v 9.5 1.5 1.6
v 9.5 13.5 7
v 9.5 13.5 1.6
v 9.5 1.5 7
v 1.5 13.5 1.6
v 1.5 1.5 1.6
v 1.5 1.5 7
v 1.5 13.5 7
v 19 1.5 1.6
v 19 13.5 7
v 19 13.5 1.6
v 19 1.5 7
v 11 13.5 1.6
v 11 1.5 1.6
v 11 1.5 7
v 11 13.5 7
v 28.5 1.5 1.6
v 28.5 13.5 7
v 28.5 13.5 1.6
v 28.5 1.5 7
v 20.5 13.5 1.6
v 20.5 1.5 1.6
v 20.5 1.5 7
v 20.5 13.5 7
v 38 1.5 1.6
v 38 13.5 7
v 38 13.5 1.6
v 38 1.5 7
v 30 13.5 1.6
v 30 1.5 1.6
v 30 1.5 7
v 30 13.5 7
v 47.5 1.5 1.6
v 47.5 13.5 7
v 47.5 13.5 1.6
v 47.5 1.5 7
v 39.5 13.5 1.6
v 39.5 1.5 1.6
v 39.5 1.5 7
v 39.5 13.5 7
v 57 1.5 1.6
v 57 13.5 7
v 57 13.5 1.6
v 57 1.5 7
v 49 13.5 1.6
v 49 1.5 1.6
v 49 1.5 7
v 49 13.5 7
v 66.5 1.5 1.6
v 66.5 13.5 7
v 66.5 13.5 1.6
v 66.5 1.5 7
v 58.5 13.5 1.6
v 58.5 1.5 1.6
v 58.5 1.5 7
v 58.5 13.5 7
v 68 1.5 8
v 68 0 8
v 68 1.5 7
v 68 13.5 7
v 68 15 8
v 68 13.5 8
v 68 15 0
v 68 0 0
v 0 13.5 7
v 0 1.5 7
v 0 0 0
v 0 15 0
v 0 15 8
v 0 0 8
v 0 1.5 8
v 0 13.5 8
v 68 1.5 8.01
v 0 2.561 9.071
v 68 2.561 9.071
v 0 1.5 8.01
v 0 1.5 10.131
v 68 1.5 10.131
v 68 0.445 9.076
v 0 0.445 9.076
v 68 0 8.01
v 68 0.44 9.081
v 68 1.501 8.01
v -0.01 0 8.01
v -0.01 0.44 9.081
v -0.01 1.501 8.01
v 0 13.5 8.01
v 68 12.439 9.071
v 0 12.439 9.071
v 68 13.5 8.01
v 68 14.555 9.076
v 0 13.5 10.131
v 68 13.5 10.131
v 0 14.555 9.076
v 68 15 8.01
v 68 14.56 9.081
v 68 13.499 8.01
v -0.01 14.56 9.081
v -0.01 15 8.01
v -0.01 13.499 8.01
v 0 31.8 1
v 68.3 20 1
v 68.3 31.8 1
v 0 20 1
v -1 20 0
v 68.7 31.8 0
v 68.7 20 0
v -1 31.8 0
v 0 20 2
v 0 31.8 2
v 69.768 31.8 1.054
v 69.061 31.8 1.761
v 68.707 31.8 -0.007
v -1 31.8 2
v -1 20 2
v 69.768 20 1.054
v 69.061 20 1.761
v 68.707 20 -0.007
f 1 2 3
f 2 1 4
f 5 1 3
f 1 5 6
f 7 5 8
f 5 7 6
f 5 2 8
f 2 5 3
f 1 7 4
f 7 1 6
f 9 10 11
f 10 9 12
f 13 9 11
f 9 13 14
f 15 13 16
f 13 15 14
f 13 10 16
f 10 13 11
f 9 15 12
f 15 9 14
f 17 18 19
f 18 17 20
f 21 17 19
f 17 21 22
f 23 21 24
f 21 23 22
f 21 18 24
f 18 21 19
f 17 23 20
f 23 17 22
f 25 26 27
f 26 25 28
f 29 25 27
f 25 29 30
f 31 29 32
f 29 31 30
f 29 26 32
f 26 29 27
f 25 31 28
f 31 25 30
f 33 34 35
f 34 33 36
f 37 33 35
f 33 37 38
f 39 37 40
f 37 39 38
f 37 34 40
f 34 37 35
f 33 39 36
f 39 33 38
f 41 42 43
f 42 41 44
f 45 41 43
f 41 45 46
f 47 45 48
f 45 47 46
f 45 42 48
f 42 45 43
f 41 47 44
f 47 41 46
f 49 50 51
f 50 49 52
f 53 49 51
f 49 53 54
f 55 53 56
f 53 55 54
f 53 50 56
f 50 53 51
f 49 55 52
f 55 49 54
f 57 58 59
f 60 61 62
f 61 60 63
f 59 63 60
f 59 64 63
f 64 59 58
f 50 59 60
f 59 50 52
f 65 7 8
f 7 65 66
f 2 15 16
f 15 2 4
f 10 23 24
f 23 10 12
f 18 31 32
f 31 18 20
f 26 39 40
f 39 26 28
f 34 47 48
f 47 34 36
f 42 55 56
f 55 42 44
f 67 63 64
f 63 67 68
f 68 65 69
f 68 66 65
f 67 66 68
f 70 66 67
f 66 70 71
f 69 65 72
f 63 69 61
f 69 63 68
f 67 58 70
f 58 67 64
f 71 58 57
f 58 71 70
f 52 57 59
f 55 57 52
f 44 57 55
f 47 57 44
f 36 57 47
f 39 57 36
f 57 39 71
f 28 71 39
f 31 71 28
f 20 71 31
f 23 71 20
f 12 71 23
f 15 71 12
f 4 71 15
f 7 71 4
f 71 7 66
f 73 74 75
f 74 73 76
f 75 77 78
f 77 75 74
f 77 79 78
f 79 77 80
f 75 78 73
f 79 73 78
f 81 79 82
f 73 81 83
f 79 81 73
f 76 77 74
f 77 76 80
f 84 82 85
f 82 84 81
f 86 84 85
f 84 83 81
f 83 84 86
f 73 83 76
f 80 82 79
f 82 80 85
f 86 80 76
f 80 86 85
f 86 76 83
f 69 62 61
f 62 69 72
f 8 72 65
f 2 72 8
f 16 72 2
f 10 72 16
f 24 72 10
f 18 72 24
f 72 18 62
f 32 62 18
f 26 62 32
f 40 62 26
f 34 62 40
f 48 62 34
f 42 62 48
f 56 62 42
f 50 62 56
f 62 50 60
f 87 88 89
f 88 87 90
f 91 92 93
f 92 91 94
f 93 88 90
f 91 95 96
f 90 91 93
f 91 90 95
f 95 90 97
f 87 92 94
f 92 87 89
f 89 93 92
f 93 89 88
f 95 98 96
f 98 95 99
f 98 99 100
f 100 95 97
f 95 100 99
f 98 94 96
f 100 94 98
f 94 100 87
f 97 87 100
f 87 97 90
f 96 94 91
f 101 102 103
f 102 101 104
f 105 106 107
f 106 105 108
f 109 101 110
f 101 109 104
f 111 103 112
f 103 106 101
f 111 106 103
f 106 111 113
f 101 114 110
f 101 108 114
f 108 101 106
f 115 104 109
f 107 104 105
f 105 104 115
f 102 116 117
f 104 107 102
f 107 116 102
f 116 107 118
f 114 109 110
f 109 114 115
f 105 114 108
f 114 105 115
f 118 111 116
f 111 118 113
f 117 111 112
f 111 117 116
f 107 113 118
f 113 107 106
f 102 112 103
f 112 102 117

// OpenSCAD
//widths for the pill compartments
wp = 8;
//depth for the pill compartments
dp = 12;

//wall size
ws = 1.5;
//pill box height
he = 7;

//tolerance
tol = .1;

difference()
{

cube([wp*7+ws*8, dp+ws*2, he]);

translate([ws,ws,0])
for (n = [0:6])
{
translate([n*wp+n*ws,0,ws+.1])
cube([wp,dp,10]);
}
}


//lid thingy
module lidthingy()
{
translate([0,0,he])
cube([wp*7+ws*8,ws,1]);


translate([0,ws,he+1.01])
rotate([45,0,0])
cube([wp*7+ws*8,ws,ws]);


translate([wp*7+ws*8,0,he+1.01])
rotate([0,-90,0])

linear_extrude(height=wp*7+ws*8+.01)
polygon(points=[[0,0],[0,1.501],[sqrt(2)*(ws/2)+.01,.44]]);

}


lidthingy();

mirror([0,1,0])
translate([0,-dp-ws*2,0])
lidthingy();


translate([0,20,0])
{

cube([wp*7+ws*8+.7,dp-tol*2,1]);
translate([-1,0,0])
cube([1,dp-tol*2,2]);

translate([wp*7+ws*8,0,.7])
rotate([0,45,0])
cube([1,dp-tol*2,1.5]);

}
